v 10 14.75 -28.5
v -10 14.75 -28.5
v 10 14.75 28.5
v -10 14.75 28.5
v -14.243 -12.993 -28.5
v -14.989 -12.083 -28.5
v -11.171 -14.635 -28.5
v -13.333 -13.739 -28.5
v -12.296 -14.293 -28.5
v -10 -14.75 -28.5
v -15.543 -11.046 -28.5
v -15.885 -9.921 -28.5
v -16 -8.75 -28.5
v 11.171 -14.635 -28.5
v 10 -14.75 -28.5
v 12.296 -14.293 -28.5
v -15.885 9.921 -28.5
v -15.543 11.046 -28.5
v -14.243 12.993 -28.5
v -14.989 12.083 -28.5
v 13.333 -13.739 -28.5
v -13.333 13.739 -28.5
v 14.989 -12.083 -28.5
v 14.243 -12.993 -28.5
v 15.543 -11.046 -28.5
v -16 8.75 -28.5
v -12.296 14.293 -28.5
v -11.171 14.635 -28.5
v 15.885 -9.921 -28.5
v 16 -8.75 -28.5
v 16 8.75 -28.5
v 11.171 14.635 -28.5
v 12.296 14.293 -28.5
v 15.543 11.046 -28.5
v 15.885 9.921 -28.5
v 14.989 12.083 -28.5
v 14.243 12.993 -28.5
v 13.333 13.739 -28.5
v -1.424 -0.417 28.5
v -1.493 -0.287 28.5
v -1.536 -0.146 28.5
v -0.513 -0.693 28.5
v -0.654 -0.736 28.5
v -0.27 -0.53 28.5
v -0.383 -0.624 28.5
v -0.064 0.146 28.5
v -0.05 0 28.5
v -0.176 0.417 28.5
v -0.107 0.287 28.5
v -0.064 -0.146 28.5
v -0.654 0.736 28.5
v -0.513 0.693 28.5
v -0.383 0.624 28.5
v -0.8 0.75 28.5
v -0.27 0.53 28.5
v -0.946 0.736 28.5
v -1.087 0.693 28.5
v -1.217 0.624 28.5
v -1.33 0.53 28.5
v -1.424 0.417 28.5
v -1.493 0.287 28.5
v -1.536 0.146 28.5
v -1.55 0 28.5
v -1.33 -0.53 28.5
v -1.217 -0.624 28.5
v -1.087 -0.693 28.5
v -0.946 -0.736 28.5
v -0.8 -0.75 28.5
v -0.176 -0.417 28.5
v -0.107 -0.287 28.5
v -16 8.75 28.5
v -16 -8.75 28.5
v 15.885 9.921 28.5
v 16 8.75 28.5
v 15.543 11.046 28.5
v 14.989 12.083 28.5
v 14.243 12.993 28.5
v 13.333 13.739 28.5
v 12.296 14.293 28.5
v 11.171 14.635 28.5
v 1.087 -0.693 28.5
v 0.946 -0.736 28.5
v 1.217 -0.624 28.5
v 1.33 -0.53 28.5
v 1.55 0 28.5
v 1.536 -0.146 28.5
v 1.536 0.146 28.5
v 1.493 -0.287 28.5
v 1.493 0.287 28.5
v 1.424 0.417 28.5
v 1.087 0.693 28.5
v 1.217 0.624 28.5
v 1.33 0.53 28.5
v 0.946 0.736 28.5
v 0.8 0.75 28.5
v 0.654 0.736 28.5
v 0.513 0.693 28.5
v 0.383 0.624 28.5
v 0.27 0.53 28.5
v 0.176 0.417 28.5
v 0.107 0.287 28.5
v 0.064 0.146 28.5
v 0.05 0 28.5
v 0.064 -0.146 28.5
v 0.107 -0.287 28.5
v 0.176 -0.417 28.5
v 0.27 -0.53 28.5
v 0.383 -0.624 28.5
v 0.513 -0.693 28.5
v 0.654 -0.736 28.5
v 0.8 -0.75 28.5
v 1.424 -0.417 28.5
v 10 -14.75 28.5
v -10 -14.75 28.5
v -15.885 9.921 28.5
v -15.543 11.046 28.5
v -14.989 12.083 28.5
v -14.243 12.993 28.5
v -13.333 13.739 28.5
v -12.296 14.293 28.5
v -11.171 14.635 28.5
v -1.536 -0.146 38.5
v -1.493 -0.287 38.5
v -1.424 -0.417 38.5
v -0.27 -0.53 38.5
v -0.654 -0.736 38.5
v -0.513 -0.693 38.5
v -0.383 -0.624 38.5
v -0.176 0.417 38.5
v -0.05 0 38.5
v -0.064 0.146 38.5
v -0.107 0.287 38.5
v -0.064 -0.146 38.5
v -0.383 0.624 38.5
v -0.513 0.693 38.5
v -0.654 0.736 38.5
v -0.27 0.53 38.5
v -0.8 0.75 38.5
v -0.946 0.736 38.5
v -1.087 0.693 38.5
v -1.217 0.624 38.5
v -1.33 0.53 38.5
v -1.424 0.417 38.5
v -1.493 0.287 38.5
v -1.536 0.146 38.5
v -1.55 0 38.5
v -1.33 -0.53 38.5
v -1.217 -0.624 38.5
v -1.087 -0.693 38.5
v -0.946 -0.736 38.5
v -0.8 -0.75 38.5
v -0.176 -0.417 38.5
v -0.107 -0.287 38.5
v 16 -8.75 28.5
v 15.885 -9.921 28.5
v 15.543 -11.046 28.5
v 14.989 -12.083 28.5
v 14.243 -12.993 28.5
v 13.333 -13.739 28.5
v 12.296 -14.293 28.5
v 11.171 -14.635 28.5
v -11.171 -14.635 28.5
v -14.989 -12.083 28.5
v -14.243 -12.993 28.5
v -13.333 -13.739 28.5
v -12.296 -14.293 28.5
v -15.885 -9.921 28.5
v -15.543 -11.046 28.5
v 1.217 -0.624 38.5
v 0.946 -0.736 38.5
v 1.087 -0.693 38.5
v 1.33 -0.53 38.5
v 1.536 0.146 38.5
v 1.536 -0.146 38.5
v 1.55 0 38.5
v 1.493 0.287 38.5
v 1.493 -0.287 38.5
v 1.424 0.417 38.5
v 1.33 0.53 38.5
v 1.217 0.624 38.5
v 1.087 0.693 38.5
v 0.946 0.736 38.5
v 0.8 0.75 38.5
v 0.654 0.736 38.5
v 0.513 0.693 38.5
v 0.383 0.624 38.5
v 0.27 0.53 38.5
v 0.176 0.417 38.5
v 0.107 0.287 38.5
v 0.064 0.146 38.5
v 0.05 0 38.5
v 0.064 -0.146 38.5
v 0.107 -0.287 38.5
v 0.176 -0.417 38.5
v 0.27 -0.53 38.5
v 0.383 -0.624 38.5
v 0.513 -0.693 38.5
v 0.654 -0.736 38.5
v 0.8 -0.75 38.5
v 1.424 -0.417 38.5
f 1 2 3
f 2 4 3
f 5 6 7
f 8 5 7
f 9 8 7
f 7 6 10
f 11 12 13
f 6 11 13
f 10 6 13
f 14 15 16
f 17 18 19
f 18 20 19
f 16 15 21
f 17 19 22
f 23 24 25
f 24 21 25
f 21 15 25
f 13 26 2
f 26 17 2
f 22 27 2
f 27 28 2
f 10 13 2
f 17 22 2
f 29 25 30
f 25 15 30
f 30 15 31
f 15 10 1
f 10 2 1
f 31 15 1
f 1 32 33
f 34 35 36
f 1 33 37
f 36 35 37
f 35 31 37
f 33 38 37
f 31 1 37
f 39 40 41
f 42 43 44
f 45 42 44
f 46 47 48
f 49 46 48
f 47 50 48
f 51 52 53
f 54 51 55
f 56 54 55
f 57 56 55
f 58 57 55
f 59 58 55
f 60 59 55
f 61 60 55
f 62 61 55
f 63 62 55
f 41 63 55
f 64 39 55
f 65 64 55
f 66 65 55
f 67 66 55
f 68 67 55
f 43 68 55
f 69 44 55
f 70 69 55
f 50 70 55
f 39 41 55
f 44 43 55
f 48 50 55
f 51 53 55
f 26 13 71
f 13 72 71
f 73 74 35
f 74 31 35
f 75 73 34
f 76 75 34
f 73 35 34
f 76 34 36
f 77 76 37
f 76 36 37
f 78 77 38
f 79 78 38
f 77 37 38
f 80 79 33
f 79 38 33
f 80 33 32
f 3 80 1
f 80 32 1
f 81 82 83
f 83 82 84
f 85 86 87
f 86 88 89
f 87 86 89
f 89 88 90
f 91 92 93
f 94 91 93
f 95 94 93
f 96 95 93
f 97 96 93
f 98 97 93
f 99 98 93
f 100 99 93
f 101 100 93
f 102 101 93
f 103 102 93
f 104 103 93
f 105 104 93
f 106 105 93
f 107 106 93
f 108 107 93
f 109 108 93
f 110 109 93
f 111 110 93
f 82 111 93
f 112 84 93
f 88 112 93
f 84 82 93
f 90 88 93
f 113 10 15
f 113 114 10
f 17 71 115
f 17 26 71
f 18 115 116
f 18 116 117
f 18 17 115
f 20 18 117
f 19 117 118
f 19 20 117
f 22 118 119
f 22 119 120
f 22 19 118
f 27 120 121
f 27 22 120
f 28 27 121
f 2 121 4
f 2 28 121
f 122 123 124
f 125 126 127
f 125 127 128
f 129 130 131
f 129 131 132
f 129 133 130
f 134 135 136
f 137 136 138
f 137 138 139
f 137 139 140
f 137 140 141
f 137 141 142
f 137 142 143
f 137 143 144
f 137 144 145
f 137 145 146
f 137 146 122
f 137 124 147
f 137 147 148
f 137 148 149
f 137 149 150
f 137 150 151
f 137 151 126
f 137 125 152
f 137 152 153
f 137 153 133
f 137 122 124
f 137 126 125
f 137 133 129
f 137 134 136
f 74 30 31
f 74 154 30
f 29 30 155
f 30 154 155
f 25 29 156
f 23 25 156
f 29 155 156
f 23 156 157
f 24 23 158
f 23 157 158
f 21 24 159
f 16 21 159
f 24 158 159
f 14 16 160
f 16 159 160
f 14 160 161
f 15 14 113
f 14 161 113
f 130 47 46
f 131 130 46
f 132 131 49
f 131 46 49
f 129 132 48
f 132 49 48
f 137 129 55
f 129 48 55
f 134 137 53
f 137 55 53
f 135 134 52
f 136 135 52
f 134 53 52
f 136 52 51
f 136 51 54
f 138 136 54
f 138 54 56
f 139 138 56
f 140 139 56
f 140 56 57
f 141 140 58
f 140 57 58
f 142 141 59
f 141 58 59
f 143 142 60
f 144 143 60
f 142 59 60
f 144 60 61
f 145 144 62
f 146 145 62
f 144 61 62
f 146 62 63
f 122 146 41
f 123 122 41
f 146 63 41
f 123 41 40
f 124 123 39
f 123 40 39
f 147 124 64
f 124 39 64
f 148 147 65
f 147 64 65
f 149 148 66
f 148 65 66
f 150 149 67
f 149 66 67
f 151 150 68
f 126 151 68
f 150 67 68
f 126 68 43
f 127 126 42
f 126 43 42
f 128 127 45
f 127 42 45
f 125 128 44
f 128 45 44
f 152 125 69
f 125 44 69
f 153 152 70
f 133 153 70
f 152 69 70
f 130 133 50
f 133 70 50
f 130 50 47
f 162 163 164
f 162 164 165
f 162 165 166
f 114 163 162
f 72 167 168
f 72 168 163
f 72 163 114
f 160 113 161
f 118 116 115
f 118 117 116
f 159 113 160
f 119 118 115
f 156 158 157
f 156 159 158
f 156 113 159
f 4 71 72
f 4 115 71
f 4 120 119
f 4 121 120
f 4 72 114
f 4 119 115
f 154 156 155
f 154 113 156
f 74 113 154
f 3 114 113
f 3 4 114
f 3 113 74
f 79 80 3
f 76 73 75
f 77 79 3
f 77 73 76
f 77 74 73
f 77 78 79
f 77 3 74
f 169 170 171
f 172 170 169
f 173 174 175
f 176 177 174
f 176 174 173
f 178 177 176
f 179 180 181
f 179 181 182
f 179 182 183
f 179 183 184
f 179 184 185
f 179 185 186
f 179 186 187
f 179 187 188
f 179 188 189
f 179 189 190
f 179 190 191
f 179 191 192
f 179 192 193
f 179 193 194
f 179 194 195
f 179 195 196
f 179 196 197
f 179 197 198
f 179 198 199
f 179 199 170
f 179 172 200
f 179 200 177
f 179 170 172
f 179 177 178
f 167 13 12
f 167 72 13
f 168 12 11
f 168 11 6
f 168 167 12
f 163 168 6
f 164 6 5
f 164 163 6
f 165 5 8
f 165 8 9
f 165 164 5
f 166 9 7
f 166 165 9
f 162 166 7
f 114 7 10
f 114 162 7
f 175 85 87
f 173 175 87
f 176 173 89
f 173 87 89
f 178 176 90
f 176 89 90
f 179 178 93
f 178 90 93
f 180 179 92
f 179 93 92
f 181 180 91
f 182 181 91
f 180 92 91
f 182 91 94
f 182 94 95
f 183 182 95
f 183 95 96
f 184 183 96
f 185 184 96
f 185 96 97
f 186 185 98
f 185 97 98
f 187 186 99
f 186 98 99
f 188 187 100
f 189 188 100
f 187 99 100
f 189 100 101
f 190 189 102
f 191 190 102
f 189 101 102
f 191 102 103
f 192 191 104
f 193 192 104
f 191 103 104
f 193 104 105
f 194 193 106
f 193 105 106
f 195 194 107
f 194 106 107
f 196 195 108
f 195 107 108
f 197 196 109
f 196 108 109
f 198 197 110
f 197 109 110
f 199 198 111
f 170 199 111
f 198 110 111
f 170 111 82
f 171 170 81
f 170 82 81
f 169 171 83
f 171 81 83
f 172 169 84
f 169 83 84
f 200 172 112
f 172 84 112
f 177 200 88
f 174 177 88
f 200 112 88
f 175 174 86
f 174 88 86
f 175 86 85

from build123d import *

# Parameters (mm, degrees)
ESQUISSE1_W          = 32
ESQUISSE1_H          = 29.5
BOSS_EXTRU_1_DEPTH   = 28.5
CONG_1_R             = 6
ESQUISSE2_R          = 0.75
BOSS_EXTRU_2_DEPTH   = 10
BOSS_EXTRU_2_2_DEPTH = 10


with BuildPart() as part:
    # Esquisse1 → Boss.-Extru.1 (new, symmetric)
    with BuildSketch(Plane.XY):
        Rectangle(ESQUISSE1_W, ESQUISSE1_H)
    extrude(amount=BOSS_EXTRU_1_DEPTH, both=True)

    # Congé1
    cong_1_edges = [part.edges().sort_by_distance(p)[0] for p in [
        (-16, 14.75, 0),
        (16, 14.75, 0),
        (16, -14.75, 0),
        (-16, -14.75, 0),
    ]]
    fillet(cong_1_edges, radius=CONG_1_R)


with BuildPart() as body_2:
    # Esquisse2 → Boss.-Extru.2 (new body)
    with BuildSketch(Plane.XY.offset(28.5)):
        with Locations((-0.8, 0)):
            Circle(ESQUISSE2_R)
    extrude(amount=BOSS_EXTRU_2_DEPTH)


with BuildPart() as body_3:
    # Esquisse2 → Boss.-Extru.2 2 (new body)
    with BuildSketch(Plane.XY.offset(28.5)):
        with Locations((0.8, 0)):
            Circle(ESQUISSE2_R)
    extrude(amount=BOSS_EXTRU_2_2_DEPTH)


solid = Compound([part.part, body_2.part, body_3.part])
